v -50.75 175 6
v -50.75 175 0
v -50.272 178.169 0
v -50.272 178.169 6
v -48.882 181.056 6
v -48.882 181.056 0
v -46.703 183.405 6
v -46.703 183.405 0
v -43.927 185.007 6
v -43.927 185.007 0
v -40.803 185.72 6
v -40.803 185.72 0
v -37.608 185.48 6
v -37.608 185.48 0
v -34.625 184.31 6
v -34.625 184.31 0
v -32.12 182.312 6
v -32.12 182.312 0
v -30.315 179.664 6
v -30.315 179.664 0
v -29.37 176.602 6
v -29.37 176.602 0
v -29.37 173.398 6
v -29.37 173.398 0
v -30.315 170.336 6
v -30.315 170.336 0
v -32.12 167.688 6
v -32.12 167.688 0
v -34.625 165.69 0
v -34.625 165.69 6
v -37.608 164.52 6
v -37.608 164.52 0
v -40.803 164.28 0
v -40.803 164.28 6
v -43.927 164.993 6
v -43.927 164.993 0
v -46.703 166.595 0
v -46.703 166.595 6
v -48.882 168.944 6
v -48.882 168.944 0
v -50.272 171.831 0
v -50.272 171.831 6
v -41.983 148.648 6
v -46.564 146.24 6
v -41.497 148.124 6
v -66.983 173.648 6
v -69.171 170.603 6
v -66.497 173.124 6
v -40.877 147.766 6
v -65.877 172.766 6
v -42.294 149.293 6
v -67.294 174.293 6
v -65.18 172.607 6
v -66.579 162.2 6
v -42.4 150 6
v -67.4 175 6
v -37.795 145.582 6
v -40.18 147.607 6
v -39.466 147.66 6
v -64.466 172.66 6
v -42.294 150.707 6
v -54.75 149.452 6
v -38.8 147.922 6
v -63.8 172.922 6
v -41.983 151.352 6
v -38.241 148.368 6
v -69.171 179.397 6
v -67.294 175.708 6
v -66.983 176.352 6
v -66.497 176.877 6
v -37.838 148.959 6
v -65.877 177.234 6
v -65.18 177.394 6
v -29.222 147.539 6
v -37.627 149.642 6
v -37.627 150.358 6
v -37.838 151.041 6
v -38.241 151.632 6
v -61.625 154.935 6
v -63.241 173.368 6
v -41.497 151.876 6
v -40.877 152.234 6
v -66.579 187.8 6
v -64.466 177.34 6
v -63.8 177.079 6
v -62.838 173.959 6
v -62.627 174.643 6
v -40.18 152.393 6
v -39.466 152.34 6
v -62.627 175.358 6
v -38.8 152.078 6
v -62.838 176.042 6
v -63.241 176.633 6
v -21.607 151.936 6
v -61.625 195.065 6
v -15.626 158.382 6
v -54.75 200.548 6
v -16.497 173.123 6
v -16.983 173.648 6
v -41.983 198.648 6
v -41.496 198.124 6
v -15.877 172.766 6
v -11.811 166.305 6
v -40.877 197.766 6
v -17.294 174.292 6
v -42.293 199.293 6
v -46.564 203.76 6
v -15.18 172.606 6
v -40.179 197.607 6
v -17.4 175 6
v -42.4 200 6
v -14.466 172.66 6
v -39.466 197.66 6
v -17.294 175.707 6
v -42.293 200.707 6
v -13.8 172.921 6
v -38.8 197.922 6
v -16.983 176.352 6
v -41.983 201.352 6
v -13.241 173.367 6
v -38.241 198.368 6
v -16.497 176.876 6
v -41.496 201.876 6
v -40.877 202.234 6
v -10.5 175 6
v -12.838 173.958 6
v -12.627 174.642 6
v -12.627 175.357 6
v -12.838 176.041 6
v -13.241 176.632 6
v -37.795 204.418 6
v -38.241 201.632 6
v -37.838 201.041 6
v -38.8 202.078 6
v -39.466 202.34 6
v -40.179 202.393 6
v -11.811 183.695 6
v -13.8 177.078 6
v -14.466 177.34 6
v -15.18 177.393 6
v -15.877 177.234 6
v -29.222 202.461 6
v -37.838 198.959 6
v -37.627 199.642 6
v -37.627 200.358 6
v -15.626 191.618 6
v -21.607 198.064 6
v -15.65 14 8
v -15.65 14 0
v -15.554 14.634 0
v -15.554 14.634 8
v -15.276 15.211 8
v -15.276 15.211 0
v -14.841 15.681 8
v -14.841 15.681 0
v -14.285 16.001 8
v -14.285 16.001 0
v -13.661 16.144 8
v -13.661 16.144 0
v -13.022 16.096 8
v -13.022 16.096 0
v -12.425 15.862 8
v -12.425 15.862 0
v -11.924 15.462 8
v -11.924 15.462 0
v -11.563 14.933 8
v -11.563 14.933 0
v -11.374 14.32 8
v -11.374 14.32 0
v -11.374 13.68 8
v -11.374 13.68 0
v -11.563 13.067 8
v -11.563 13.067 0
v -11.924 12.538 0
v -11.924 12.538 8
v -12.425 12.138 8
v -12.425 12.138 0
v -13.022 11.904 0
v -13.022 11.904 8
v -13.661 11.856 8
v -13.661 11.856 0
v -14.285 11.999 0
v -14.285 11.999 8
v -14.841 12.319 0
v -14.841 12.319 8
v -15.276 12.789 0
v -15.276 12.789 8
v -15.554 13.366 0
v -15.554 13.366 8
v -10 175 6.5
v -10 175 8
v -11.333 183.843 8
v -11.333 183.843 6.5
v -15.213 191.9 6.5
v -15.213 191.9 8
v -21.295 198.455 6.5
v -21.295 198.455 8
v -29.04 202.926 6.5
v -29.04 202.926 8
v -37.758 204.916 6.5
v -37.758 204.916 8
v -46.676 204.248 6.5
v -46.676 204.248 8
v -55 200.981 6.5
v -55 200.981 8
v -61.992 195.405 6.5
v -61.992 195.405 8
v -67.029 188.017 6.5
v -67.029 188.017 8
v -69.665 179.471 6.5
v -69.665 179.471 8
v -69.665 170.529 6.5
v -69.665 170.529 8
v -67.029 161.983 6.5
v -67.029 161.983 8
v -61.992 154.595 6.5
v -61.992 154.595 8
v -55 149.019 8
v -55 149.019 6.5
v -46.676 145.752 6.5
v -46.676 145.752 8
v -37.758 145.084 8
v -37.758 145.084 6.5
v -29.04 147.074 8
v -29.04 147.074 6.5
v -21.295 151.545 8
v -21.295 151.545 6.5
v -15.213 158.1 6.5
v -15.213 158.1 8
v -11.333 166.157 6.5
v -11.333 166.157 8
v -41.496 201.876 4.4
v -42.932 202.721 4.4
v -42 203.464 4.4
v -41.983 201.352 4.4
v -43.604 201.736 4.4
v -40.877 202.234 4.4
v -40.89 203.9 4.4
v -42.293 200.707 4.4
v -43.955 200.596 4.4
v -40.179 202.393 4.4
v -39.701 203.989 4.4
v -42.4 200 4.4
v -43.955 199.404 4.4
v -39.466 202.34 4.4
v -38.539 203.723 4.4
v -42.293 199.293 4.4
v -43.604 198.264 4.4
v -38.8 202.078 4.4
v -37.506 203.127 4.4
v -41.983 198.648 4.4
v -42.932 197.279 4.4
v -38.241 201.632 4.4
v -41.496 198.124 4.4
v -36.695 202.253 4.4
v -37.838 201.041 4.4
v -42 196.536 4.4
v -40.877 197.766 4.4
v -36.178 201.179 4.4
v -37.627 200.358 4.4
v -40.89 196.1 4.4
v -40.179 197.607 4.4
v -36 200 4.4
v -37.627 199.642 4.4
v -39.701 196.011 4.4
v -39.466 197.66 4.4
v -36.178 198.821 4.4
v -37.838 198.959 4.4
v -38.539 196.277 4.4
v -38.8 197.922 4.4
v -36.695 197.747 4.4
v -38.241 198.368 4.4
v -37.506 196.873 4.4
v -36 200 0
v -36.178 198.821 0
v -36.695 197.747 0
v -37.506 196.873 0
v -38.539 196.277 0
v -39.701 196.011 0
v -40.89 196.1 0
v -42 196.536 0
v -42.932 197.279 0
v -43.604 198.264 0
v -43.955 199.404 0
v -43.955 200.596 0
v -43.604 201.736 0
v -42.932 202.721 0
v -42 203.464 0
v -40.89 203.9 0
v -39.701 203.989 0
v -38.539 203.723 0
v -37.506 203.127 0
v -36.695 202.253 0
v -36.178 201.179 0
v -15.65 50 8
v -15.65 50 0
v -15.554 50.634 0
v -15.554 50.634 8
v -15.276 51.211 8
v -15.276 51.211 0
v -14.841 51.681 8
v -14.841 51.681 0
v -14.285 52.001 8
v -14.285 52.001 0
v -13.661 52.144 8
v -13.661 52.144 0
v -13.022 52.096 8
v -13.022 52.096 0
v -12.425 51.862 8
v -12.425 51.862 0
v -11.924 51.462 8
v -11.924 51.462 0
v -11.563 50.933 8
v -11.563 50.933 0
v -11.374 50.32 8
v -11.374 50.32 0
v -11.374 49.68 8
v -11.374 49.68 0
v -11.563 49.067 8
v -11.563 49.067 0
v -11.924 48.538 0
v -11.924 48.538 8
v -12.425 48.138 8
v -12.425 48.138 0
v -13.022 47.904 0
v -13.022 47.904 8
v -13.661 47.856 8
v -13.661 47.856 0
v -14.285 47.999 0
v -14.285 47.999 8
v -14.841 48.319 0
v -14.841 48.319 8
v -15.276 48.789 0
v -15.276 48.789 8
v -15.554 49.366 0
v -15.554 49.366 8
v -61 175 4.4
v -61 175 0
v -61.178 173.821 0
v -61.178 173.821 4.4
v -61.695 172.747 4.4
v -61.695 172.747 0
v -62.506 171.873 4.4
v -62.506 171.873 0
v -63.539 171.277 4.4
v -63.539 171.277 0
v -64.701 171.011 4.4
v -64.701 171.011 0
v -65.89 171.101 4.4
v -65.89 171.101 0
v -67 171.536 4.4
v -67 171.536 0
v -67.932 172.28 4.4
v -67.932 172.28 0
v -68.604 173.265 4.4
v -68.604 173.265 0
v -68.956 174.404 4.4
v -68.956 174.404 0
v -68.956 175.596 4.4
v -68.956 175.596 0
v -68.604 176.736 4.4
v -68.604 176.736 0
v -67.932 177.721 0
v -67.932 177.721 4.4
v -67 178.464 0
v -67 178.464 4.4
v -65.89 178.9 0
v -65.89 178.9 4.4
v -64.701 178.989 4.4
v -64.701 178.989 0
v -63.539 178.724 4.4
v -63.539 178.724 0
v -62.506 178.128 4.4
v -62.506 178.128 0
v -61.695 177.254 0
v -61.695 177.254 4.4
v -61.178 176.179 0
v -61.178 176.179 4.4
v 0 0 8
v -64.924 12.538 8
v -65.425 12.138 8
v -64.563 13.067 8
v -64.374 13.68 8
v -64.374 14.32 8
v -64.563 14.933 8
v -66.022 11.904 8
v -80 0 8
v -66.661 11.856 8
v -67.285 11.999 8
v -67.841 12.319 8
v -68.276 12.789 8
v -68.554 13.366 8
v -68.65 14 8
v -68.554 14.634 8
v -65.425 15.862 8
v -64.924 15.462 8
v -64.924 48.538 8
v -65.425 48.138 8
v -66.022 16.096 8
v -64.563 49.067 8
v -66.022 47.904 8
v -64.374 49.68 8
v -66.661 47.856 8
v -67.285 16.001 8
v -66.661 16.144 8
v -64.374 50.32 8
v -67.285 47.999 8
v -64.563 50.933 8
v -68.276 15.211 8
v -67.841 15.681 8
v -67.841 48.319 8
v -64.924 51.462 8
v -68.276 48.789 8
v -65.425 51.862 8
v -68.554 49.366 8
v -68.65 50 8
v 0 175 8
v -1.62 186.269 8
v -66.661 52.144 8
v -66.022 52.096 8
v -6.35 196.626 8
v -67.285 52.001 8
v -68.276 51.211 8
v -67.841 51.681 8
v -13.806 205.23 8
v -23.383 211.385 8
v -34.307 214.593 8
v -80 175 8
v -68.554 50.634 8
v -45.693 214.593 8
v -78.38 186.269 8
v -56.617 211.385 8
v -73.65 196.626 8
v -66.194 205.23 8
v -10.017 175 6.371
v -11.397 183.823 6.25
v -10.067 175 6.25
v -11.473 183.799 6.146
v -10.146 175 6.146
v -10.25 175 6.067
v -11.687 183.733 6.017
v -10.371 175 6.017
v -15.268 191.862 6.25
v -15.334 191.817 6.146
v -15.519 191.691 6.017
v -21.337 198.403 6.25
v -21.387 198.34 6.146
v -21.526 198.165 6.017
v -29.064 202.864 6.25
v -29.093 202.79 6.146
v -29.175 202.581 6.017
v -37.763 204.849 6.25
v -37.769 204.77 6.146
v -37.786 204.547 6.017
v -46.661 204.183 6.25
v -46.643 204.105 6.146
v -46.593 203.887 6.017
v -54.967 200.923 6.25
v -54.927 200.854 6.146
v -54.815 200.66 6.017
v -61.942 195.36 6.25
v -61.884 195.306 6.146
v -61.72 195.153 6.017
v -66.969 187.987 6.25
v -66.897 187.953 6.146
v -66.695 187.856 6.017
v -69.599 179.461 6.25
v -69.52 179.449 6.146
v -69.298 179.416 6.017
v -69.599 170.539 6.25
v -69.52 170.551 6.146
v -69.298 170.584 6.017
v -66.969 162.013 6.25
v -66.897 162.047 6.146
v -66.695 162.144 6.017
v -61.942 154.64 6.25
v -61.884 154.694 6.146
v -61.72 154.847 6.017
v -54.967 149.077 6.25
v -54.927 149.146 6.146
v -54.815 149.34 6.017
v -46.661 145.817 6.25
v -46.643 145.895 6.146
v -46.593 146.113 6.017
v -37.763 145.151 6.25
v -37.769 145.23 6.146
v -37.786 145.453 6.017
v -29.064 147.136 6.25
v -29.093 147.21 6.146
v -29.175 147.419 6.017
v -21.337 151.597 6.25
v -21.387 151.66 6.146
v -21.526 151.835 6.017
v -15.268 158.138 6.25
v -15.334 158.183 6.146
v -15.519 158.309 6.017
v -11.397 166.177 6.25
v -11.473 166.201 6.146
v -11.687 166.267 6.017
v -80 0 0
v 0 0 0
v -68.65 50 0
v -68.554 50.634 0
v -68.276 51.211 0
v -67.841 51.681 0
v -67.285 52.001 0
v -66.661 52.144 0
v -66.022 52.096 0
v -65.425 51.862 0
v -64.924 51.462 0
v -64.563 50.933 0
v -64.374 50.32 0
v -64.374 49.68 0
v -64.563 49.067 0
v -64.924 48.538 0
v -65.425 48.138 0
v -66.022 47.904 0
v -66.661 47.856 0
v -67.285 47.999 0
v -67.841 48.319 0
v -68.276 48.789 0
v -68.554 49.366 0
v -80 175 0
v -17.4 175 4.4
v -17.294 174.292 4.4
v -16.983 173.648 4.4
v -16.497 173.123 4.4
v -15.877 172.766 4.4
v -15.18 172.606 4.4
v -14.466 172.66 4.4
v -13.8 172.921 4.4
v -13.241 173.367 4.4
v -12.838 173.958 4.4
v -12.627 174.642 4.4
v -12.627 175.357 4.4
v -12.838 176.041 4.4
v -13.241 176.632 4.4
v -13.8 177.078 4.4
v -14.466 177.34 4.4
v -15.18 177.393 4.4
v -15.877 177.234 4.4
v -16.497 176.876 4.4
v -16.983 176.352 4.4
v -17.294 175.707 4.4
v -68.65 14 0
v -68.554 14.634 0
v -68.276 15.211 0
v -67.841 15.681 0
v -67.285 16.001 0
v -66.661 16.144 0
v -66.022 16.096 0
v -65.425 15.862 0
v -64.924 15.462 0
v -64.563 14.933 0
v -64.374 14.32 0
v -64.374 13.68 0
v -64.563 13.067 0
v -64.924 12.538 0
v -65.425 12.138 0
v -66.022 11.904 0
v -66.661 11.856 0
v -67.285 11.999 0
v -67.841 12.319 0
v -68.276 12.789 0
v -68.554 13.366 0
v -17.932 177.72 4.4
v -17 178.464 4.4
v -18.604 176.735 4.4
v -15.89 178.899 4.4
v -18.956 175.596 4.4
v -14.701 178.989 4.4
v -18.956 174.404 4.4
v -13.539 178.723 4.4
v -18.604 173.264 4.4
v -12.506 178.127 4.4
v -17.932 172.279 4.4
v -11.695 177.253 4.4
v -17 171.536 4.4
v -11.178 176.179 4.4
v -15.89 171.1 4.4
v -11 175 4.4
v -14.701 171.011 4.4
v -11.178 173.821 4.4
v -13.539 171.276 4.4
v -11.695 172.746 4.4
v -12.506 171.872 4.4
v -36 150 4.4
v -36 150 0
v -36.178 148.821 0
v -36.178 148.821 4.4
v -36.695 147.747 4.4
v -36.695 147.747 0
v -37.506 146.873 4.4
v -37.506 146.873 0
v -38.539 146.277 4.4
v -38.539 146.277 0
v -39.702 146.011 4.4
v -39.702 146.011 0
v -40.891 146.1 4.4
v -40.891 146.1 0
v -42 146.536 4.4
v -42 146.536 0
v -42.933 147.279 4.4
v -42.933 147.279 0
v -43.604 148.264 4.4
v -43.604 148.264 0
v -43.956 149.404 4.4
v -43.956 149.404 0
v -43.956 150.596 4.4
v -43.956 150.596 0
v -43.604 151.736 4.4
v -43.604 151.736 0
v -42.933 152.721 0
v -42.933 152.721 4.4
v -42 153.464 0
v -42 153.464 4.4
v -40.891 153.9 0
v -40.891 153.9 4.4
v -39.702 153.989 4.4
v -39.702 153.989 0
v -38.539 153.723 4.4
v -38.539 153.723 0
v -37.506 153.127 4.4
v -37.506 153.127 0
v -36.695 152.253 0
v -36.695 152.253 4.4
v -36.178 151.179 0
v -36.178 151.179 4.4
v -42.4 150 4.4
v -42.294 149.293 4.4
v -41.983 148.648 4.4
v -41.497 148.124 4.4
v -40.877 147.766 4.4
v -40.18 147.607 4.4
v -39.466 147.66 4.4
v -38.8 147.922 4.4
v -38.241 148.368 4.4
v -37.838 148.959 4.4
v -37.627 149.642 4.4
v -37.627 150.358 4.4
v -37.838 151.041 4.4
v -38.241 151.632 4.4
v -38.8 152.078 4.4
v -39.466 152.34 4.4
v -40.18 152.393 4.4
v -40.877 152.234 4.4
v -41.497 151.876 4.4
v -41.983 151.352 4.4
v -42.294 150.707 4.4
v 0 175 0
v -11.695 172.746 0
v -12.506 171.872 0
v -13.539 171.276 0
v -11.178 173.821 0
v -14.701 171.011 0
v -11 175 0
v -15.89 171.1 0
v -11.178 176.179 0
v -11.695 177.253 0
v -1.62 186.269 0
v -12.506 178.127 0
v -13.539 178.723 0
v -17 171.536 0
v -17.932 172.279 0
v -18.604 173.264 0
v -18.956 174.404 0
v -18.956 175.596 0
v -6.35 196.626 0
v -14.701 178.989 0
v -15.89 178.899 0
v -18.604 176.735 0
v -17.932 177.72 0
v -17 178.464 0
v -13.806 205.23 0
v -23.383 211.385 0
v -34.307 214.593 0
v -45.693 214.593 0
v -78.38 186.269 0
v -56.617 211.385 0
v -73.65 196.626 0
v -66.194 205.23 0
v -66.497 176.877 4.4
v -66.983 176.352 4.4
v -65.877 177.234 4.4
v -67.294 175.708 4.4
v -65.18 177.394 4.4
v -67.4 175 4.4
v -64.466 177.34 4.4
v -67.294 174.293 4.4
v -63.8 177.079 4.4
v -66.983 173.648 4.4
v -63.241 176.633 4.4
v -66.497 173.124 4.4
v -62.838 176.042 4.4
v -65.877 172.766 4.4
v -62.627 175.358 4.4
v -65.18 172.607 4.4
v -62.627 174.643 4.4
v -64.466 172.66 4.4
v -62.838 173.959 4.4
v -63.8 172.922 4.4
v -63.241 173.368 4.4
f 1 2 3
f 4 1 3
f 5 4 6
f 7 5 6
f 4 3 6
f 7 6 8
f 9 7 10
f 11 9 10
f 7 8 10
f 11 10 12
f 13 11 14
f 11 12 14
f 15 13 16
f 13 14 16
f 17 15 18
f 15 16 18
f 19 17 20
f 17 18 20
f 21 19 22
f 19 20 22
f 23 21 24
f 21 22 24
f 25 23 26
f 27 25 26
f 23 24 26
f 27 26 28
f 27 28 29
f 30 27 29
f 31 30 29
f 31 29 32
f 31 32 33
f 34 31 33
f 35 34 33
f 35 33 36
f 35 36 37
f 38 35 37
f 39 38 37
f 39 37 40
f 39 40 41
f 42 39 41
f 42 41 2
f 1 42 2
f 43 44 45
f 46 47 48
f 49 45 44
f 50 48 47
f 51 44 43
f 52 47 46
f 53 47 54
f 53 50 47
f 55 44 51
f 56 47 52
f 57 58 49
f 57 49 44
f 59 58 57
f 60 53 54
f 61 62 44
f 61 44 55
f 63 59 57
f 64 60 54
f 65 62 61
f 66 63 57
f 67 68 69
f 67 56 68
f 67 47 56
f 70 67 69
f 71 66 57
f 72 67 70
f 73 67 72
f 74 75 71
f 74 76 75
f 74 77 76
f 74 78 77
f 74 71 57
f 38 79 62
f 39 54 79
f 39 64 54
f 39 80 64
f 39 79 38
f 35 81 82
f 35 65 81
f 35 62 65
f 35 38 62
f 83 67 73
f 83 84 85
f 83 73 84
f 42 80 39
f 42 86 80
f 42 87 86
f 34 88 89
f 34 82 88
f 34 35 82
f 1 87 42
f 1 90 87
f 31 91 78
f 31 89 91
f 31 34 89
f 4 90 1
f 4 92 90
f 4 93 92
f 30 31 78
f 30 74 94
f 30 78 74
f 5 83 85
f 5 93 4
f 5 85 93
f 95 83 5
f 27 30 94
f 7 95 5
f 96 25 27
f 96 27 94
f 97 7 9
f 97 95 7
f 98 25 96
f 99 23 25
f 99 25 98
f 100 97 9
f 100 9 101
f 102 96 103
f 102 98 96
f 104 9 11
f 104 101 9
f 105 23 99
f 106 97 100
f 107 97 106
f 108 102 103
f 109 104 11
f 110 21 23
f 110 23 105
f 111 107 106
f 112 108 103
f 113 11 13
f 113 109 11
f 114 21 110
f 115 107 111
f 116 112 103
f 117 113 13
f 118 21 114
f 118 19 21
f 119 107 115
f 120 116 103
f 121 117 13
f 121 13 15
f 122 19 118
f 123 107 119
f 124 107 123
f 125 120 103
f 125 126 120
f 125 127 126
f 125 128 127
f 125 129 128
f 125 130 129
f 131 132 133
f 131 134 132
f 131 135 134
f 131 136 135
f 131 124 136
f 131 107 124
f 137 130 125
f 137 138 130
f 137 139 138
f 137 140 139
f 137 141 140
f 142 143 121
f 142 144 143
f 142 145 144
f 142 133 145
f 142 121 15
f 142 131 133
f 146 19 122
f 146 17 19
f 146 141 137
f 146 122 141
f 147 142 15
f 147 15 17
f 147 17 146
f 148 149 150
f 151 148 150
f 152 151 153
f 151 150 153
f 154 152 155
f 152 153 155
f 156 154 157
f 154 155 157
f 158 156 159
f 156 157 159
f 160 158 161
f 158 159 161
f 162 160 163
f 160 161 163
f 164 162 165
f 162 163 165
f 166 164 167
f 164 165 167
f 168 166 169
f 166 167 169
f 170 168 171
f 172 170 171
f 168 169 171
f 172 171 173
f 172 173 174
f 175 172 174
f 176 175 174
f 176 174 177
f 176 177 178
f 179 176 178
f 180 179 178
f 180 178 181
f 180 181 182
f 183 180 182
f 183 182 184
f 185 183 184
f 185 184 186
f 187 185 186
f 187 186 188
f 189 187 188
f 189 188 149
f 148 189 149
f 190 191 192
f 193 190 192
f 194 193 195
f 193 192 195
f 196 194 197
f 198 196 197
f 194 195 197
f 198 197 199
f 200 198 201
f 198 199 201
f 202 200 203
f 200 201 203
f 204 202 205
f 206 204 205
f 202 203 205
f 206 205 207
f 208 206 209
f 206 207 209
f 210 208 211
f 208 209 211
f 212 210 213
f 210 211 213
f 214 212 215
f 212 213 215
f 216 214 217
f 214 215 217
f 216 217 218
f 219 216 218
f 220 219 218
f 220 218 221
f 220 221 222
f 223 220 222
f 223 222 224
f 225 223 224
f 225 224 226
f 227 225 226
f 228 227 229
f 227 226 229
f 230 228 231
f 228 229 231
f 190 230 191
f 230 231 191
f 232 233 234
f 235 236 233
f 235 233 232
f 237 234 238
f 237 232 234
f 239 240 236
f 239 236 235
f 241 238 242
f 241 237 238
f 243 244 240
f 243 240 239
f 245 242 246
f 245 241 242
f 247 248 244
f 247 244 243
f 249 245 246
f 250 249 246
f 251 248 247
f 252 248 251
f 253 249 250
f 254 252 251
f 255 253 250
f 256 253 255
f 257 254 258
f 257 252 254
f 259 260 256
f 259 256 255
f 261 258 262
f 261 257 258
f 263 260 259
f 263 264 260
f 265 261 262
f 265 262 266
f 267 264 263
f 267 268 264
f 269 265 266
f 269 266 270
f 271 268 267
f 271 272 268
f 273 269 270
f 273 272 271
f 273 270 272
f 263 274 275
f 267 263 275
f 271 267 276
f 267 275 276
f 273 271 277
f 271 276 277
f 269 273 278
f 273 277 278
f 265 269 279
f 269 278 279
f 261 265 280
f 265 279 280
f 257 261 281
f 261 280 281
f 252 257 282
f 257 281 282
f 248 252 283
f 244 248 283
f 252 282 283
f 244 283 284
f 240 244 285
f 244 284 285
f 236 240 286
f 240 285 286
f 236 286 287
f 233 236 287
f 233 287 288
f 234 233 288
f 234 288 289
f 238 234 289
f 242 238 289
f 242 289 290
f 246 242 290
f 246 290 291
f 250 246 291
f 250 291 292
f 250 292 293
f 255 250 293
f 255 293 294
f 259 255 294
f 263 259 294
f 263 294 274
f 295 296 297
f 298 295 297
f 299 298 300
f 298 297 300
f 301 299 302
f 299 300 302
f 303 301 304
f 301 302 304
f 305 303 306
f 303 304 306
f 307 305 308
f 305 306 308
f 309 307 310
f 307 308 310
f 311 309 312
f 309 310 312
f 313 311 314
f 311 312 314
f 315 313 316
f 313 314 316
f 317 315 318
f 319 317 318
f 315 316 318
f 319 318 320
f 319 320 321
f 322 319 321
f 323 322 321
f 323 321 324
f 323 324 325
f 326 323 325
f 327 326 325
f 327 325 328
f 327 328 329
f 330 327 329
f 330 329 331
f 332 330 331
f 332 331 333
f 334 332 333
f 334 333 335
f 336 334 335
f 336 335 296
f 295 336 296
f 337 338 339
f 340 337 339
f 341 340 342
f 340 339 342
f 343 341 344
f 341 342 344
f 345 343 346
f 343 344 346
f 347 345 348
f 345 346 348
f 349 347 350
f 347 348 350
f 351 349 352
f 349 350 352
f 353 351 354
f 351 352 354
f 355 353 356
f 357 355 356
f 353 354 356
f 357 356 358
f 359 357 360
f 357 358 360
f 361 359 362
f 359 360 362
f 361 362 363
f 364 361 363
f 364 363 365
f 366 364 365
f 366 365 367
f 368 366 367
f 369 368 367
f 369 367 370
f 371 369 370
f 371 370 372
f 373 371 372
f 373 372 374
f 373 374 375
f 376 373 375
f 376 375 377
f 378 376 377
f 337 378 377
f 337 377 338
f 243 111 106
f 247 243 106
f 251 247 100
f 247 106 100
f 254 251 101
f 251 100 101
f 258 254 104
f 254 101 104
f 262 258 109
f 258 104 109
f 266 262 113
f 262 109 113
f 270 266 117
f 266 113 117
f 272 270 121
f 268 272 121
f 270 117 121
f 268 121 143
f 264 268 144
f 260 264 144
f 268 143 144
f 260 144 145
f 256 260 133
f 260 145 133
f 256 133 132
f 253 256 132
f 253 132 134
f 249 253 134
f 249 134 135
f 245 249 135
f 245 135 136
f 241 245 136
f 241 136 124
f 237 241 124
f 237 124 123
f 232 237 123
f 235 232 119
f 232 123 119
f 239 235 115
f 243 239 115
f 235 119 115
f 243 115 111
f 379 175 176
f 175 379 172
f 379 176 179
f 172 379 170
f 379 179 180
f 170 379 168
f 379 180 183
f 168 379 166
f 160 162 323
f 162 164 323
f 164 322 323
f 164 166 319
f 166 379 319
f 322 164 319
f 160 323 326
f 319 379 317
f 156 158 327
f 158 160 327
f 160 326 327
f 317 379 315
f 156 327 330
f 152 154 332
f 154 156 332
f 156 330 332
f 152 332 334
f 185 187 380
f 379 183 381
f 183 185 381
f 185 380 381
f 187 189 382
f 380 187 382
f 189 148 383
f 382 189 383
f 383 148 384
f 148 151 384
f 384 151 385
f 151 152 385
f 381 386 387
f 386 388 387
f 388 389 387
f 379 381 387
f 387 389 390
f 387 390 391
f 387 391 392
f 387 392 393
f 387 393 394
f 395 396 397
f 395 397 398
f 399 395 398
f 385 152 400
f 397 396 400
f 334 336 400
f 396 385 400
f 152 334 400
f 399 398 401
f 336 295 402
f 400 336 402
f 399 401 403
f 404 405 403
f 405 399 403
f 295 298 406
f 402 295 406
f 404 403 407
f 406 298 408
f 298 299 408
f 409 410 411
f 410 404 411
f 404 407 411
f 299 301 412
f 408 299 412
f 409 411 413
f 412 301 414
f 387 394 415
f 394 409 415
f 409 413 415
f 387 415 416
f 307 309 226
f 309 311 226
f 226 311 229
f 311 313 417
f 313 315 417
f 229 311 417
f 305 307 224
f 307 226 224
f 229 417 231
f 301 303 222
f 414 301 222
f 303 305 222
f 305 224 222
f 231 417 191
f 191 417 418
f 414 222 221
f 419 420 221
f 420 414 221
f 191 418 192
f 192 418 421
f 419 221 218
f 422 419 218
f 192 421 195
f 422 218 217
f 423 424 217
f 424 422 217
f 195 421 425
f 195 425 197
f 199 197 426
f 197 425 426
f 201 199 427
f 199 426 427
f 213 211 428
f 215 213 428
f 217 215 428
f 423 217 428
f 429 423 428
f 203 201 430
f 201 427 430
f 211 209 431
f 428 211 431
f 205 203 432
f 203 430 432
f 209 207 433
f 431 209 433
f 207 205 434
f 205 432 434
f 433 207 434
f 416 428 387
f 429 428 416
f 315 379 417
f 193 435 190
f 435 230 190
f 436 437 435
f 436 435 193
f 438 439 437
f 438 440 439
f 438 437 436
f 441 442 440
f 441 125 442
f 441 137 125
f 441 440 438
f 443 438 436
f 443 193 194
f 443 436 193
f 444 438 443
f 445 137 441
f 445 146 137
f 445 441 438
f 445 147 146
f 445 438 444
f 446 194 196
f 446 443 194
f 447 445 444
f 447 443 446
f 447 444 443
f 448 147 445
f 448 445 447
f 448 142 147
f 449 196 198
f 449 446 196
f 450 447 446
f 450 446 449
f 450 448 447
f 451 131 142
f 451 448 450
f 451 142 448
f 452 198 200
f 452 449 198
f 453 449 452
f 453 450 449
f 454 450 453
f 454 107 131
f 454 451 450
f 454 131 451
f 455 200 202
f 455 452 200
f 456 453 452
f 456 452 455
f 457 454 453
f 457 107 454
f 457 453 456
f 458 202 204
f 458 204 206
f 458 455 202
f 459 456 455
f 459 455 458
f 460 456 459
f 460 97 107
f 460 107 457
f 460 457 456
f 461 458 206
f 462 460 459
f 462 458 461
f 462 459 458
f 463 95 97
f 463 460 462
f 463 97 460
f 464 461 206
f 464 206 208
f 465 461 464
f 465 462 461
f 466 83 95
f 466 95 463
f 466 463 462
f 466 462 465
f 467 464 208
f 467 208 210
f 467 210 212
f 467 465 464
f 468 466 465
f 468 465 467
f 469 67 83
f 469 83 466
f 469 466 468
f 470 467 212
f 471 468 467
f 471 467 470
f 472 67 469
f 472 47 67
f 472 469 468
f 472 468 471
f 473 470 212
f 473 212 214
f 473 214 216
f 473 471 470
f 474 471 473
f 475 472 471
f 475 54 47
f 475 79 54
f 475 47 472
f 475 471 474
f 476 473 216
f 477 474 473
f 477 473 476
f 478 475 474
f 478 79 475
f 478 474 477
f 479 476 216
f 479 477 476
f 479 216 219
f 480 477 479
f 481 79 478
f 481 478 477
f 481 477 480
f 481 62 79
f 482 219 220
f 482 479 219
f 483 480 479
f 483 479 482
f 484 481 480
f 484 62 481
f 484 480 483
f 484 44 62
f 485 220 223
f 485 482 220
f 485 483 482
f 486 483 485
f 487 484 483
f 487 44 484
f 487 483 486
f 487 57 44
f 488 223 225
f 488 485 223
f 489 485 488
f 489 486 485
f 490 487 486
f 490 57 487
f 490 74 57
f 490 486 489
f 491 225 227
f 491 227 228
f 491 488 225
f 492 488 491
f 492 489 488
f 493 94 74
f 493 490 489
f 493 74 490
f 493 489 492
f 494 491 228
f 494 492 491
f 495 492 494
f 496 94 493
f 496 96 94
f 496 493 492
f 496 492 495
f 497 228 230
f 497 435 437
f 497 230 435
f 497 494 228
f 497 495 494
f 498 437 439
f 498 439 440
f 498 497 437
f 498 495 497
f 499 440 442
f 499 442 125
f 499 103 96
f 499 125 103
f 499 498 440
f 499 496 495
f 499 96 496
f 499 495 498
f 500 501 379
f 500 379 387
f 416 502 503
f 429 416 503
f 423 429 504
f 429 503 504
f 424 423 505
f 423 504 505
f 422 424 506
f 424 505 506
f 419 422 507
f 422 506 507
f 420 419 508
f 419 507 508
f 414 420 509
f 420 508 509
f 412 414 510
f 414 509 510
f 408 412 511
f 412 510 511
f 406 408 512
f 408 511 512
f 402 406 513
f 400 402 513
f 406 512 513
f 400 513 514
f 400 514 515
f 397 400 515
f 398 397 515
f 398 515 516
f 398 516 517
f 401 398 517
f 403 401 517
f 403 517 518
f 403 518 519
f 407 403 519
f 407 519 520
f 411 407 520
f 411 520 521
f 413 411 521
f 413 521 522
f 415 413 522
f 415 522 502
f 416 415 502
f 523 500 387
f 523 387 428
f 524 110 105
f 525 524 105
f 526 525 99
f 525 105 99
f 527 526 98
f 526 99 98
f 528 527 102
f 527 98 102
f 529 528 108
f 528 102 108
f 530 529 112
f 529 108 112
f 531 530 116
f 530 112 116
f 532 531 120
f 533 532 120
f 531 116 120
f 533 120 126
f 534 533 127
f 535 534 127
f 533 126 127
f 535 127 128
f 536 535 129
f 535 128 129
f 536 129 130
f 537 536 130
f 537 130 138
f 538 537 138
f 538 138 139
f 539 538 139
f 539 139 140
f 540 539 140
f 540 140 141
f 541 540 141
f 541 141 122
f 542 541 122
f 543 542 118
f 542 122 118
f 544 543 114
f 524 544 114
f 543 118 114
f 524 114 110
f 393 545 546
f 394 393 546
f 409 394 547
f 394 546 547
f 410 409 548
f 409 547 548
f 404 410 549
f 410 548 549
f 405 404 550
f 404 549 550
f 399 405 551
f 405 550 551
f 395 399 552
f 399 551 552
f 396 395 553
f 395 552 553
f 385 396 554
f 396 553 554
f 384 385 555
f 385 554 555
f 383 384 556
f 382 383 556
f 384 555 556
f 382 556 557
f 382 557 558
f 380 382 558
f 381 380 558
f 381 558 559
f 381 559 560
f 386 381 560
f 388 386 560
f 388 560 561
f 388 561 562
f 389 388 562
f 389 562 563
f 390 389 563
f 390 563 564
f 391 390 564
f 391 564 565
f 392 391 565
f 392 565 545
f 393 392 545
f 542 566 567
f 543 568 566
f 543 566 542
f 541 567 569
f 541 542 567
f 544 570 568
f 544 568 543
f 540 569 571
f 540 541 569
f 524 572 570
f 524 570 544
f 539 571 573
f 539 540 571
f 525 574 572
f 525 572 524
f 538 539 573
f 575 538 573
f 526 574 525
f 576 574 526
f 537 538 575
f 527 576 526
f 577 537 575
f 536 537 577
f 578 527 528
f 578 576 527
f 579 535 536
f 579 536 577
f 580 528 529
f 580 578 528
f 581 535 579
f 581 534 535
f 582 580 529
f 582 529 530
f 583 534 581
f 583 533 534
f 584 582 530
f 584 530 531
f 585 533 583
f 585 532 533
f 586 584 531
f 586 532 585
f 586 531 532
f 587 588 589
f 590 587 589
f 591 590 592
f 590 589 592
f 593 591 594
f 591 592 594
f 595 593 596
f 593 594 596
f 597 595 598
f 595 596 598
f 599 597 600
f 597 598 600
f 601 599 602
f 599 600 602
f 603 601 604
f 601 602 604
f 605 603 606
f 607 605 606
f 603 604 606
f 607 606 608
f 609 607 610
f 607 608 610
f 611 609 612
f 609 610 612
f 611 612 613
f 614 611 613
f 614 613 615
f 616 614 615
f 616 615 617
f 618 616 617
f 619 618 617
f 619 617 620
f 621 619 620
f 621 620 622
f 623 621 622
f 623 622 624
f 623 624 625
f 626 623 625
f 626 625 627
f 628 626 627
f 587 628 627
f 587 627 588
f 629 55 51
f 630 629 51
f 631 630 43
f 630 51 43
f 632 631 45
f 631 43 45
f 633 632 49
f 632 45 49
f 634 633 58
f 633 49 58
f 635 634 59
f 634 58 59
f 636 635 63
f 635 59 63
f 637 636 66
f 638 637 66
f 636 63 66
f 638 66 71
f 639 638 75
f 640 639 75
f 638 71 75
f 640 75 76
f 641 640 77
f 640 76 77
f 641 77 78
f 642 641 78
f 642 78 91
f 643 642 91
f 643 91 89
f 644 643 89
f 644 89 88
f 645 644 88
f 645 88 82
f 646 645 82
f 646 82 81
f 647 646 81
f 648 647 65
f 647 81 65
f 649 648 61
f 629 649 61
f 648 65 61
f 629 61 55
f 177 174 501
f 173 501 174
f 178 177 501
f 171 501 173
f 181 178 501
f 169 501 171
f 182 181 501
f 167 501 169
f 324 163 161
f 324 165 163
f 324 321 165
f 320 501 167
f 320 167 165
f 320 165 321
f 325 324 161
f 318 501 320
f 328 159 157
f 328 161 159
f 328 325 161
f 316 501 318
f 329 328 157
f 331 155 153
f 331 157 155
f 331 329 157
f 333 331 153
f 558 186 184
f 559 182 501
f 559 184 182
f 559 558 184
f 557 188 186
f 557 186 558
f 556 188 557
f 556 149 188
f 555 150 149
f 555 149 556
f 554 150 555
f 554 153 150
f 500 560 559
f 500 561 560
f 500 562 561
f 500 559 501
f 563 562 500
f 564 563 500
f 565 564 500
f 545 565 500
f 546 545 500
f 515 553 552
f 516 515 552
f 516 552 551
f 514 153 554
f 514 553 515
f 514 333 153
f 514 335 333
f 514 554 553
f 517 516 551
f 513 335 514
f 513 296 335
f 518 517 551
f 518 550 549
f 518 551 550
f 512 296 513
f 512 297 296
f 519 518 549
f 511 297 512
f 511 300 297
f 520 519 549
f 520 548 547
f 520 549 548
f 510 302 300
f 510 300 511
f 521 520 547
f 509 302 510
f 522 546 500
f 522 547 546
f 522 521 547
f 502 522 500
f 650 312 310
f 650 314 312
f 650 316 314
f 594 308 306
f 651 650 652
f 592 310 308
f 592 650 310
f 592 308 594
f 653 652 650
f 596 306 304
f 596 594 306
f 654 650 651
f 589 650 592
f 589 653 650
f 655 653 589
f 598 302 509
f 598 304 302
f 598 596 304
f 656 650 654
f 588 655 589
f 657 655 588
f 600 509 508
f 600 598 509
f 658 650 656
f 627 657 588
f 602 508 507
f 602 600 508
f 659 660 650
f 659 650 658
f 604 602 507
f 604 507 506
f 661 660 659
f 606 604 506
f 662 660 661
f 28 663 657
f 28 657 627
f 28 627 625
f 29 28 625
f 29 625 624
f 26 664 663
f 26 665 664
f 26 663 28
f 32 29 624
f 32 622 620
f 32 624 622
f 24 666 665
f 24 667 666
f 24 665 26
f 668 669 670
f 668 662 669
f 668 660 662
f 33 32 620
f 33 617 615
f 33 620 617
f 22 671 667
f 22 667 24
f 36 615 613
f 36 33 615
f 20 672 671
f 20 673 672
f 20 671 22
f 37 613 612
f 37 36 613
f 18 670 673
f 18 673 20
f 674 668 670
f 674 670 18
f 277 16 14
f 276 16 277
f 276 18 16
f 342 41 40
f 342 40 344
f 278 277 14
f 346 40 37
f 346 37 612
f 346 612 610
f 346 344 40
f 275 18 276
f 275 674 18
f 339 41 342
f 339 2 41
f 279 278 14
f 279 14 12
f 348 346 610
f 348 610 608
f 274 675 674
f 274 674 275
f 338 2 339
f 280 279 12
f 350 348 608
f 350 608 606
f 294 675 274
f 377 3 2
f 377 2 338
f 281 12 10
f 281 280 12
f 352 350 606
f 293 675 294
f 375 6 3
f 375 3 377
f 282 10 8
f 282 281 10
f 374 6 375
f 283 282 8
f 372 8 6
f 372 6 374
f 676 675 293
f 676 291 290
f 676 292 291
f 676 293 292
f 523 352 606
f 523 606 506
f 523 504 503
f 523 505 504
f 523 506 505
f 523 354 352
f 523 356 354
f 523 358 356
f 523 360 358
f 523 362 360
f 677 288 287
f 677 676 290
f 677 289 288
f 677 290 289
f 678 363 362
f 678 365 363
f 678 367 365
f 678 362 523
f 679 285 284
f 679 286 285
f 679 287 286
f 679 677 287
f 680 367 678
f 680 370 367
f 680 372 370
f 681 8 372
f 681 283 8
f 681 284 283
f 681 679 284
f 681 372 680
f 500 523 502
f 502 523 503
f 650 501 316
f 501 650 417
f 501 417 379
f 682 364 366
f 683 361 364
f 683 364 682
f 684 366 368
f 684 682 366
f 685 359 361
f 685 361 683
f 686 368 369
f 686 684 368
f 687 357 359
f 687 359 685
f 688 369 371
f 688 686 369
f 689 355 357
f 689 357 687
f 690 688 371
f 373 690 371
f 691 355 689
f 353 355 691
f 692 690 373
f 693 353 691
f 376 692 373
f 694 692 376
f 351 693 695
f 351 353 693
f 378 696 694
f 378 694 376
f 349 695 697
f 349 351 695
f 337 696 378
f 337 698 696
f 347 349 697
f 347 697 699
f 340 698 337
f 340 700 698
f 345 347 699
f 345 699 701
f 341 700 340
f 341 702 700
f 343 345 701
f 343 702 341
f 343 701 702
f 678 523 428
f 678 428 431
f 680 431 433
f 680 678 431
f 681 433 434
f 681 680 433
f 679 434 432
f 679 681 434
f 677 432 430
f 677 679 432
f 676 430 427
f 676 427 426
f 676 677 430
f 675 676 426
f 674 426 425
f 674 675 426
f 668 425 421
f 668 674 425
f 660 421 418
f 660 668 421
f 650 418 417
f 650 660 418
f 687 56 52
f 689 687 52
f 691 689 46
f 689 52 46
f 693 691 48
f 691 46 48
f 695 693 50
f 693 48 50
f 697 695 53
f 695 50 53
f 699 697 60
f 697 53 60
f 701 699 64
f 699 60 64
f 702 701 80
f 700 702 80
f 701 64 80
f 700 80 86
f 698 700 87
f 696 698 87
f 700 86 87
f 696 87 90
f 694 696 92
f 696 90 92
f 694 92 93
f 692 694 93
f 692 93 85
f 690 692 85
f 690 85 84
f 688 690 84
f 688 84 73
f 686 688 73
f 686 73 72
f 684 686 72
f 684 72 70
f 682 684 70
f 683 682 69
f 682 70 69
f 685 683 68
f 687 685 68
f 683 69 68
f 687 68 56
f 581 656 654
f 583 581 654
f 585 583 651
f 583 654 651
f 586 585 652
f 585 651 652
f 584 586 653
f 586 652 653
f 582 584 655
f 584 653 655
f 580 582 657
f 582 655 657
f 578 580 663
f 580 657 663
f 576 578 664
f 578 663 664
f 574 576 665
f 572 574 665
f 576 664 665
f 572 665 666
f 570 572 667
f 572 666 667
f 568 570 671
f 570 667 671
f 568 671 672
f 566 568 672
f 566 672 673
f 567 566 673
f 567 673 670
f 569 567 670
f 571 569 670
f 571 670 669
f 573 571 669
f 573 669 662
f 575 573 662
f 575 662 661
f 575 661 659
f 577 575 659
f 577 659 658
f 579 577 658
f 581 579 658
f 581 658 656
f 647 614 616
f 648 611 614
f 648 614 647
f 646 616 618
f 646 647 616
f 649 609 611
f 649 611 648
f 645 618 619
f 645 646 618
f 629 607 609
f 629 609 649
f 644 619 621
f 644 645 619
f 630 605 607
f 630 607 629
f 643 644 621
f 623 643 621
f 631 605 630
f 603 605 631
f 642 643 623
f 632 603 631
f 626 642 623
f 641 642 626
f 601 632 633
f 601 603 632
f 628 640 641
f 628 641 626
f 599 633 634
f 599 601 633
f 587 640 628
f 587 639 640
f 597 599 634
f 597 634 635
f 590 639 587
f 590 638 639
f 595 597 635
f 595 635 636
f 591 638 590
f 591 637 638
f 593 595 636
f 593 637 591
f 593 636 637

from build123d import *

# Parameters (mm, degrees)
SKETCH1_R                                           = 5
BOSS_EXTRUDE1_DEPTH                                 = 8
M4_CLEARANCE_HOLE1_D                                = 4.3
F_20_0MM_TRANSITIONAL_DOWEL_HOLE1_D                 = 21.5
CBORE_FOR_M4_HEX_SOCKET_HEAD_CAP_SCREW3_D           = 4.8
CBORE_FOR_M4_HEX_SOCKET_HEAD_CAP_SCREW3_CBORE_D     = 8
CBORE_FOR_M4_HEX_SOCKET_HEAD_CAP_SCREW3_CBORE_DEPTH = 4.4
SKETCH12_R                                          = 30
CUT_EXTRUDE1_DEPTH                                  = 2
FILLET1_R                                           = 0.5


with BuildPart() as part:
    # Sketch1 → Boss-Extrude1 (new body)
    with BuildSketch(Plane.XY):
        with BuildLine():
            Line((0, 0), (-80, 0))
            Line((-80, 0), (-80, 175))
            ThreePointArc((-80, 175), (-40, 215), (0, 175))
            Line((0, 175), (0, 0))
        make_face()
        with Locations((-40, 175)):
            Circle(SKETCH1_R, mode=Mode.SUBTRACT)
    extrude(amount=BOSS_EXTRUDE1_DEPTH)

    # M4 Clearance Hole1 (through all)
    with Locations(Plane.XY.offset(8)):
        with Locations((-66.5, 14), (-13.5, 14), (-13.5, 50), (-66.5, 50)):
            Hole(M4_CLEARANCE_HOLE1_D / 2)

    # Ø20.0mm Transitional Dowel Hole1 (through all)
    with Locations(Plane.XY.offset(8)):
        with Locations((-40, 175)):
            Hole(F_20_0MM_TRANSITIONAL_DOWEL_HOLE1_D / 2)

    # CBORE for M4 Hex Socket Head Cap Screw3 (through all)
    with Locations(Plane(origin=(0, 0, 0), x_dir=(1, 0, 0), z_dir=(0, 0, -1))):
        with Locations((-40, -200), (-15.000221056, -174.999778948), (-40.000442109, -150.000000004), (-65.000221052, -175.000221056)):
            CounterBoreHole(CBORE_FOR_M4_HEX_SOCKET_HEAD_CAP_SCREW3_D / 2, CBORE_FOR_M4_HEX_SOCKET_HEAD_CAP_SCREW3_CBORE_D / 2, CBORE_FOR_M4_HEX_SOCKET_HEAD_CAP_SCREW3_CBORE_DEPTH)

    # Sketch12 → Cut-Extrude1 (cut)
    with BuildSketch(Plane.XY.offset(8)):
        with Locations((-40, 175)):
            Circle(SKETCH12_R)
    extrude(amount=-CUT_EXTRUDE1_DEPTH, mode=Mode.SUBTRACT)

    # Fillet1
    fillet1_edges = [part.edges().sort_by_distance(p)[0] for p in [
        (-70, 175, 6),
    ]]
    fillet(fillet1_edges, radius=FILLET1_R)


solid = part.part
